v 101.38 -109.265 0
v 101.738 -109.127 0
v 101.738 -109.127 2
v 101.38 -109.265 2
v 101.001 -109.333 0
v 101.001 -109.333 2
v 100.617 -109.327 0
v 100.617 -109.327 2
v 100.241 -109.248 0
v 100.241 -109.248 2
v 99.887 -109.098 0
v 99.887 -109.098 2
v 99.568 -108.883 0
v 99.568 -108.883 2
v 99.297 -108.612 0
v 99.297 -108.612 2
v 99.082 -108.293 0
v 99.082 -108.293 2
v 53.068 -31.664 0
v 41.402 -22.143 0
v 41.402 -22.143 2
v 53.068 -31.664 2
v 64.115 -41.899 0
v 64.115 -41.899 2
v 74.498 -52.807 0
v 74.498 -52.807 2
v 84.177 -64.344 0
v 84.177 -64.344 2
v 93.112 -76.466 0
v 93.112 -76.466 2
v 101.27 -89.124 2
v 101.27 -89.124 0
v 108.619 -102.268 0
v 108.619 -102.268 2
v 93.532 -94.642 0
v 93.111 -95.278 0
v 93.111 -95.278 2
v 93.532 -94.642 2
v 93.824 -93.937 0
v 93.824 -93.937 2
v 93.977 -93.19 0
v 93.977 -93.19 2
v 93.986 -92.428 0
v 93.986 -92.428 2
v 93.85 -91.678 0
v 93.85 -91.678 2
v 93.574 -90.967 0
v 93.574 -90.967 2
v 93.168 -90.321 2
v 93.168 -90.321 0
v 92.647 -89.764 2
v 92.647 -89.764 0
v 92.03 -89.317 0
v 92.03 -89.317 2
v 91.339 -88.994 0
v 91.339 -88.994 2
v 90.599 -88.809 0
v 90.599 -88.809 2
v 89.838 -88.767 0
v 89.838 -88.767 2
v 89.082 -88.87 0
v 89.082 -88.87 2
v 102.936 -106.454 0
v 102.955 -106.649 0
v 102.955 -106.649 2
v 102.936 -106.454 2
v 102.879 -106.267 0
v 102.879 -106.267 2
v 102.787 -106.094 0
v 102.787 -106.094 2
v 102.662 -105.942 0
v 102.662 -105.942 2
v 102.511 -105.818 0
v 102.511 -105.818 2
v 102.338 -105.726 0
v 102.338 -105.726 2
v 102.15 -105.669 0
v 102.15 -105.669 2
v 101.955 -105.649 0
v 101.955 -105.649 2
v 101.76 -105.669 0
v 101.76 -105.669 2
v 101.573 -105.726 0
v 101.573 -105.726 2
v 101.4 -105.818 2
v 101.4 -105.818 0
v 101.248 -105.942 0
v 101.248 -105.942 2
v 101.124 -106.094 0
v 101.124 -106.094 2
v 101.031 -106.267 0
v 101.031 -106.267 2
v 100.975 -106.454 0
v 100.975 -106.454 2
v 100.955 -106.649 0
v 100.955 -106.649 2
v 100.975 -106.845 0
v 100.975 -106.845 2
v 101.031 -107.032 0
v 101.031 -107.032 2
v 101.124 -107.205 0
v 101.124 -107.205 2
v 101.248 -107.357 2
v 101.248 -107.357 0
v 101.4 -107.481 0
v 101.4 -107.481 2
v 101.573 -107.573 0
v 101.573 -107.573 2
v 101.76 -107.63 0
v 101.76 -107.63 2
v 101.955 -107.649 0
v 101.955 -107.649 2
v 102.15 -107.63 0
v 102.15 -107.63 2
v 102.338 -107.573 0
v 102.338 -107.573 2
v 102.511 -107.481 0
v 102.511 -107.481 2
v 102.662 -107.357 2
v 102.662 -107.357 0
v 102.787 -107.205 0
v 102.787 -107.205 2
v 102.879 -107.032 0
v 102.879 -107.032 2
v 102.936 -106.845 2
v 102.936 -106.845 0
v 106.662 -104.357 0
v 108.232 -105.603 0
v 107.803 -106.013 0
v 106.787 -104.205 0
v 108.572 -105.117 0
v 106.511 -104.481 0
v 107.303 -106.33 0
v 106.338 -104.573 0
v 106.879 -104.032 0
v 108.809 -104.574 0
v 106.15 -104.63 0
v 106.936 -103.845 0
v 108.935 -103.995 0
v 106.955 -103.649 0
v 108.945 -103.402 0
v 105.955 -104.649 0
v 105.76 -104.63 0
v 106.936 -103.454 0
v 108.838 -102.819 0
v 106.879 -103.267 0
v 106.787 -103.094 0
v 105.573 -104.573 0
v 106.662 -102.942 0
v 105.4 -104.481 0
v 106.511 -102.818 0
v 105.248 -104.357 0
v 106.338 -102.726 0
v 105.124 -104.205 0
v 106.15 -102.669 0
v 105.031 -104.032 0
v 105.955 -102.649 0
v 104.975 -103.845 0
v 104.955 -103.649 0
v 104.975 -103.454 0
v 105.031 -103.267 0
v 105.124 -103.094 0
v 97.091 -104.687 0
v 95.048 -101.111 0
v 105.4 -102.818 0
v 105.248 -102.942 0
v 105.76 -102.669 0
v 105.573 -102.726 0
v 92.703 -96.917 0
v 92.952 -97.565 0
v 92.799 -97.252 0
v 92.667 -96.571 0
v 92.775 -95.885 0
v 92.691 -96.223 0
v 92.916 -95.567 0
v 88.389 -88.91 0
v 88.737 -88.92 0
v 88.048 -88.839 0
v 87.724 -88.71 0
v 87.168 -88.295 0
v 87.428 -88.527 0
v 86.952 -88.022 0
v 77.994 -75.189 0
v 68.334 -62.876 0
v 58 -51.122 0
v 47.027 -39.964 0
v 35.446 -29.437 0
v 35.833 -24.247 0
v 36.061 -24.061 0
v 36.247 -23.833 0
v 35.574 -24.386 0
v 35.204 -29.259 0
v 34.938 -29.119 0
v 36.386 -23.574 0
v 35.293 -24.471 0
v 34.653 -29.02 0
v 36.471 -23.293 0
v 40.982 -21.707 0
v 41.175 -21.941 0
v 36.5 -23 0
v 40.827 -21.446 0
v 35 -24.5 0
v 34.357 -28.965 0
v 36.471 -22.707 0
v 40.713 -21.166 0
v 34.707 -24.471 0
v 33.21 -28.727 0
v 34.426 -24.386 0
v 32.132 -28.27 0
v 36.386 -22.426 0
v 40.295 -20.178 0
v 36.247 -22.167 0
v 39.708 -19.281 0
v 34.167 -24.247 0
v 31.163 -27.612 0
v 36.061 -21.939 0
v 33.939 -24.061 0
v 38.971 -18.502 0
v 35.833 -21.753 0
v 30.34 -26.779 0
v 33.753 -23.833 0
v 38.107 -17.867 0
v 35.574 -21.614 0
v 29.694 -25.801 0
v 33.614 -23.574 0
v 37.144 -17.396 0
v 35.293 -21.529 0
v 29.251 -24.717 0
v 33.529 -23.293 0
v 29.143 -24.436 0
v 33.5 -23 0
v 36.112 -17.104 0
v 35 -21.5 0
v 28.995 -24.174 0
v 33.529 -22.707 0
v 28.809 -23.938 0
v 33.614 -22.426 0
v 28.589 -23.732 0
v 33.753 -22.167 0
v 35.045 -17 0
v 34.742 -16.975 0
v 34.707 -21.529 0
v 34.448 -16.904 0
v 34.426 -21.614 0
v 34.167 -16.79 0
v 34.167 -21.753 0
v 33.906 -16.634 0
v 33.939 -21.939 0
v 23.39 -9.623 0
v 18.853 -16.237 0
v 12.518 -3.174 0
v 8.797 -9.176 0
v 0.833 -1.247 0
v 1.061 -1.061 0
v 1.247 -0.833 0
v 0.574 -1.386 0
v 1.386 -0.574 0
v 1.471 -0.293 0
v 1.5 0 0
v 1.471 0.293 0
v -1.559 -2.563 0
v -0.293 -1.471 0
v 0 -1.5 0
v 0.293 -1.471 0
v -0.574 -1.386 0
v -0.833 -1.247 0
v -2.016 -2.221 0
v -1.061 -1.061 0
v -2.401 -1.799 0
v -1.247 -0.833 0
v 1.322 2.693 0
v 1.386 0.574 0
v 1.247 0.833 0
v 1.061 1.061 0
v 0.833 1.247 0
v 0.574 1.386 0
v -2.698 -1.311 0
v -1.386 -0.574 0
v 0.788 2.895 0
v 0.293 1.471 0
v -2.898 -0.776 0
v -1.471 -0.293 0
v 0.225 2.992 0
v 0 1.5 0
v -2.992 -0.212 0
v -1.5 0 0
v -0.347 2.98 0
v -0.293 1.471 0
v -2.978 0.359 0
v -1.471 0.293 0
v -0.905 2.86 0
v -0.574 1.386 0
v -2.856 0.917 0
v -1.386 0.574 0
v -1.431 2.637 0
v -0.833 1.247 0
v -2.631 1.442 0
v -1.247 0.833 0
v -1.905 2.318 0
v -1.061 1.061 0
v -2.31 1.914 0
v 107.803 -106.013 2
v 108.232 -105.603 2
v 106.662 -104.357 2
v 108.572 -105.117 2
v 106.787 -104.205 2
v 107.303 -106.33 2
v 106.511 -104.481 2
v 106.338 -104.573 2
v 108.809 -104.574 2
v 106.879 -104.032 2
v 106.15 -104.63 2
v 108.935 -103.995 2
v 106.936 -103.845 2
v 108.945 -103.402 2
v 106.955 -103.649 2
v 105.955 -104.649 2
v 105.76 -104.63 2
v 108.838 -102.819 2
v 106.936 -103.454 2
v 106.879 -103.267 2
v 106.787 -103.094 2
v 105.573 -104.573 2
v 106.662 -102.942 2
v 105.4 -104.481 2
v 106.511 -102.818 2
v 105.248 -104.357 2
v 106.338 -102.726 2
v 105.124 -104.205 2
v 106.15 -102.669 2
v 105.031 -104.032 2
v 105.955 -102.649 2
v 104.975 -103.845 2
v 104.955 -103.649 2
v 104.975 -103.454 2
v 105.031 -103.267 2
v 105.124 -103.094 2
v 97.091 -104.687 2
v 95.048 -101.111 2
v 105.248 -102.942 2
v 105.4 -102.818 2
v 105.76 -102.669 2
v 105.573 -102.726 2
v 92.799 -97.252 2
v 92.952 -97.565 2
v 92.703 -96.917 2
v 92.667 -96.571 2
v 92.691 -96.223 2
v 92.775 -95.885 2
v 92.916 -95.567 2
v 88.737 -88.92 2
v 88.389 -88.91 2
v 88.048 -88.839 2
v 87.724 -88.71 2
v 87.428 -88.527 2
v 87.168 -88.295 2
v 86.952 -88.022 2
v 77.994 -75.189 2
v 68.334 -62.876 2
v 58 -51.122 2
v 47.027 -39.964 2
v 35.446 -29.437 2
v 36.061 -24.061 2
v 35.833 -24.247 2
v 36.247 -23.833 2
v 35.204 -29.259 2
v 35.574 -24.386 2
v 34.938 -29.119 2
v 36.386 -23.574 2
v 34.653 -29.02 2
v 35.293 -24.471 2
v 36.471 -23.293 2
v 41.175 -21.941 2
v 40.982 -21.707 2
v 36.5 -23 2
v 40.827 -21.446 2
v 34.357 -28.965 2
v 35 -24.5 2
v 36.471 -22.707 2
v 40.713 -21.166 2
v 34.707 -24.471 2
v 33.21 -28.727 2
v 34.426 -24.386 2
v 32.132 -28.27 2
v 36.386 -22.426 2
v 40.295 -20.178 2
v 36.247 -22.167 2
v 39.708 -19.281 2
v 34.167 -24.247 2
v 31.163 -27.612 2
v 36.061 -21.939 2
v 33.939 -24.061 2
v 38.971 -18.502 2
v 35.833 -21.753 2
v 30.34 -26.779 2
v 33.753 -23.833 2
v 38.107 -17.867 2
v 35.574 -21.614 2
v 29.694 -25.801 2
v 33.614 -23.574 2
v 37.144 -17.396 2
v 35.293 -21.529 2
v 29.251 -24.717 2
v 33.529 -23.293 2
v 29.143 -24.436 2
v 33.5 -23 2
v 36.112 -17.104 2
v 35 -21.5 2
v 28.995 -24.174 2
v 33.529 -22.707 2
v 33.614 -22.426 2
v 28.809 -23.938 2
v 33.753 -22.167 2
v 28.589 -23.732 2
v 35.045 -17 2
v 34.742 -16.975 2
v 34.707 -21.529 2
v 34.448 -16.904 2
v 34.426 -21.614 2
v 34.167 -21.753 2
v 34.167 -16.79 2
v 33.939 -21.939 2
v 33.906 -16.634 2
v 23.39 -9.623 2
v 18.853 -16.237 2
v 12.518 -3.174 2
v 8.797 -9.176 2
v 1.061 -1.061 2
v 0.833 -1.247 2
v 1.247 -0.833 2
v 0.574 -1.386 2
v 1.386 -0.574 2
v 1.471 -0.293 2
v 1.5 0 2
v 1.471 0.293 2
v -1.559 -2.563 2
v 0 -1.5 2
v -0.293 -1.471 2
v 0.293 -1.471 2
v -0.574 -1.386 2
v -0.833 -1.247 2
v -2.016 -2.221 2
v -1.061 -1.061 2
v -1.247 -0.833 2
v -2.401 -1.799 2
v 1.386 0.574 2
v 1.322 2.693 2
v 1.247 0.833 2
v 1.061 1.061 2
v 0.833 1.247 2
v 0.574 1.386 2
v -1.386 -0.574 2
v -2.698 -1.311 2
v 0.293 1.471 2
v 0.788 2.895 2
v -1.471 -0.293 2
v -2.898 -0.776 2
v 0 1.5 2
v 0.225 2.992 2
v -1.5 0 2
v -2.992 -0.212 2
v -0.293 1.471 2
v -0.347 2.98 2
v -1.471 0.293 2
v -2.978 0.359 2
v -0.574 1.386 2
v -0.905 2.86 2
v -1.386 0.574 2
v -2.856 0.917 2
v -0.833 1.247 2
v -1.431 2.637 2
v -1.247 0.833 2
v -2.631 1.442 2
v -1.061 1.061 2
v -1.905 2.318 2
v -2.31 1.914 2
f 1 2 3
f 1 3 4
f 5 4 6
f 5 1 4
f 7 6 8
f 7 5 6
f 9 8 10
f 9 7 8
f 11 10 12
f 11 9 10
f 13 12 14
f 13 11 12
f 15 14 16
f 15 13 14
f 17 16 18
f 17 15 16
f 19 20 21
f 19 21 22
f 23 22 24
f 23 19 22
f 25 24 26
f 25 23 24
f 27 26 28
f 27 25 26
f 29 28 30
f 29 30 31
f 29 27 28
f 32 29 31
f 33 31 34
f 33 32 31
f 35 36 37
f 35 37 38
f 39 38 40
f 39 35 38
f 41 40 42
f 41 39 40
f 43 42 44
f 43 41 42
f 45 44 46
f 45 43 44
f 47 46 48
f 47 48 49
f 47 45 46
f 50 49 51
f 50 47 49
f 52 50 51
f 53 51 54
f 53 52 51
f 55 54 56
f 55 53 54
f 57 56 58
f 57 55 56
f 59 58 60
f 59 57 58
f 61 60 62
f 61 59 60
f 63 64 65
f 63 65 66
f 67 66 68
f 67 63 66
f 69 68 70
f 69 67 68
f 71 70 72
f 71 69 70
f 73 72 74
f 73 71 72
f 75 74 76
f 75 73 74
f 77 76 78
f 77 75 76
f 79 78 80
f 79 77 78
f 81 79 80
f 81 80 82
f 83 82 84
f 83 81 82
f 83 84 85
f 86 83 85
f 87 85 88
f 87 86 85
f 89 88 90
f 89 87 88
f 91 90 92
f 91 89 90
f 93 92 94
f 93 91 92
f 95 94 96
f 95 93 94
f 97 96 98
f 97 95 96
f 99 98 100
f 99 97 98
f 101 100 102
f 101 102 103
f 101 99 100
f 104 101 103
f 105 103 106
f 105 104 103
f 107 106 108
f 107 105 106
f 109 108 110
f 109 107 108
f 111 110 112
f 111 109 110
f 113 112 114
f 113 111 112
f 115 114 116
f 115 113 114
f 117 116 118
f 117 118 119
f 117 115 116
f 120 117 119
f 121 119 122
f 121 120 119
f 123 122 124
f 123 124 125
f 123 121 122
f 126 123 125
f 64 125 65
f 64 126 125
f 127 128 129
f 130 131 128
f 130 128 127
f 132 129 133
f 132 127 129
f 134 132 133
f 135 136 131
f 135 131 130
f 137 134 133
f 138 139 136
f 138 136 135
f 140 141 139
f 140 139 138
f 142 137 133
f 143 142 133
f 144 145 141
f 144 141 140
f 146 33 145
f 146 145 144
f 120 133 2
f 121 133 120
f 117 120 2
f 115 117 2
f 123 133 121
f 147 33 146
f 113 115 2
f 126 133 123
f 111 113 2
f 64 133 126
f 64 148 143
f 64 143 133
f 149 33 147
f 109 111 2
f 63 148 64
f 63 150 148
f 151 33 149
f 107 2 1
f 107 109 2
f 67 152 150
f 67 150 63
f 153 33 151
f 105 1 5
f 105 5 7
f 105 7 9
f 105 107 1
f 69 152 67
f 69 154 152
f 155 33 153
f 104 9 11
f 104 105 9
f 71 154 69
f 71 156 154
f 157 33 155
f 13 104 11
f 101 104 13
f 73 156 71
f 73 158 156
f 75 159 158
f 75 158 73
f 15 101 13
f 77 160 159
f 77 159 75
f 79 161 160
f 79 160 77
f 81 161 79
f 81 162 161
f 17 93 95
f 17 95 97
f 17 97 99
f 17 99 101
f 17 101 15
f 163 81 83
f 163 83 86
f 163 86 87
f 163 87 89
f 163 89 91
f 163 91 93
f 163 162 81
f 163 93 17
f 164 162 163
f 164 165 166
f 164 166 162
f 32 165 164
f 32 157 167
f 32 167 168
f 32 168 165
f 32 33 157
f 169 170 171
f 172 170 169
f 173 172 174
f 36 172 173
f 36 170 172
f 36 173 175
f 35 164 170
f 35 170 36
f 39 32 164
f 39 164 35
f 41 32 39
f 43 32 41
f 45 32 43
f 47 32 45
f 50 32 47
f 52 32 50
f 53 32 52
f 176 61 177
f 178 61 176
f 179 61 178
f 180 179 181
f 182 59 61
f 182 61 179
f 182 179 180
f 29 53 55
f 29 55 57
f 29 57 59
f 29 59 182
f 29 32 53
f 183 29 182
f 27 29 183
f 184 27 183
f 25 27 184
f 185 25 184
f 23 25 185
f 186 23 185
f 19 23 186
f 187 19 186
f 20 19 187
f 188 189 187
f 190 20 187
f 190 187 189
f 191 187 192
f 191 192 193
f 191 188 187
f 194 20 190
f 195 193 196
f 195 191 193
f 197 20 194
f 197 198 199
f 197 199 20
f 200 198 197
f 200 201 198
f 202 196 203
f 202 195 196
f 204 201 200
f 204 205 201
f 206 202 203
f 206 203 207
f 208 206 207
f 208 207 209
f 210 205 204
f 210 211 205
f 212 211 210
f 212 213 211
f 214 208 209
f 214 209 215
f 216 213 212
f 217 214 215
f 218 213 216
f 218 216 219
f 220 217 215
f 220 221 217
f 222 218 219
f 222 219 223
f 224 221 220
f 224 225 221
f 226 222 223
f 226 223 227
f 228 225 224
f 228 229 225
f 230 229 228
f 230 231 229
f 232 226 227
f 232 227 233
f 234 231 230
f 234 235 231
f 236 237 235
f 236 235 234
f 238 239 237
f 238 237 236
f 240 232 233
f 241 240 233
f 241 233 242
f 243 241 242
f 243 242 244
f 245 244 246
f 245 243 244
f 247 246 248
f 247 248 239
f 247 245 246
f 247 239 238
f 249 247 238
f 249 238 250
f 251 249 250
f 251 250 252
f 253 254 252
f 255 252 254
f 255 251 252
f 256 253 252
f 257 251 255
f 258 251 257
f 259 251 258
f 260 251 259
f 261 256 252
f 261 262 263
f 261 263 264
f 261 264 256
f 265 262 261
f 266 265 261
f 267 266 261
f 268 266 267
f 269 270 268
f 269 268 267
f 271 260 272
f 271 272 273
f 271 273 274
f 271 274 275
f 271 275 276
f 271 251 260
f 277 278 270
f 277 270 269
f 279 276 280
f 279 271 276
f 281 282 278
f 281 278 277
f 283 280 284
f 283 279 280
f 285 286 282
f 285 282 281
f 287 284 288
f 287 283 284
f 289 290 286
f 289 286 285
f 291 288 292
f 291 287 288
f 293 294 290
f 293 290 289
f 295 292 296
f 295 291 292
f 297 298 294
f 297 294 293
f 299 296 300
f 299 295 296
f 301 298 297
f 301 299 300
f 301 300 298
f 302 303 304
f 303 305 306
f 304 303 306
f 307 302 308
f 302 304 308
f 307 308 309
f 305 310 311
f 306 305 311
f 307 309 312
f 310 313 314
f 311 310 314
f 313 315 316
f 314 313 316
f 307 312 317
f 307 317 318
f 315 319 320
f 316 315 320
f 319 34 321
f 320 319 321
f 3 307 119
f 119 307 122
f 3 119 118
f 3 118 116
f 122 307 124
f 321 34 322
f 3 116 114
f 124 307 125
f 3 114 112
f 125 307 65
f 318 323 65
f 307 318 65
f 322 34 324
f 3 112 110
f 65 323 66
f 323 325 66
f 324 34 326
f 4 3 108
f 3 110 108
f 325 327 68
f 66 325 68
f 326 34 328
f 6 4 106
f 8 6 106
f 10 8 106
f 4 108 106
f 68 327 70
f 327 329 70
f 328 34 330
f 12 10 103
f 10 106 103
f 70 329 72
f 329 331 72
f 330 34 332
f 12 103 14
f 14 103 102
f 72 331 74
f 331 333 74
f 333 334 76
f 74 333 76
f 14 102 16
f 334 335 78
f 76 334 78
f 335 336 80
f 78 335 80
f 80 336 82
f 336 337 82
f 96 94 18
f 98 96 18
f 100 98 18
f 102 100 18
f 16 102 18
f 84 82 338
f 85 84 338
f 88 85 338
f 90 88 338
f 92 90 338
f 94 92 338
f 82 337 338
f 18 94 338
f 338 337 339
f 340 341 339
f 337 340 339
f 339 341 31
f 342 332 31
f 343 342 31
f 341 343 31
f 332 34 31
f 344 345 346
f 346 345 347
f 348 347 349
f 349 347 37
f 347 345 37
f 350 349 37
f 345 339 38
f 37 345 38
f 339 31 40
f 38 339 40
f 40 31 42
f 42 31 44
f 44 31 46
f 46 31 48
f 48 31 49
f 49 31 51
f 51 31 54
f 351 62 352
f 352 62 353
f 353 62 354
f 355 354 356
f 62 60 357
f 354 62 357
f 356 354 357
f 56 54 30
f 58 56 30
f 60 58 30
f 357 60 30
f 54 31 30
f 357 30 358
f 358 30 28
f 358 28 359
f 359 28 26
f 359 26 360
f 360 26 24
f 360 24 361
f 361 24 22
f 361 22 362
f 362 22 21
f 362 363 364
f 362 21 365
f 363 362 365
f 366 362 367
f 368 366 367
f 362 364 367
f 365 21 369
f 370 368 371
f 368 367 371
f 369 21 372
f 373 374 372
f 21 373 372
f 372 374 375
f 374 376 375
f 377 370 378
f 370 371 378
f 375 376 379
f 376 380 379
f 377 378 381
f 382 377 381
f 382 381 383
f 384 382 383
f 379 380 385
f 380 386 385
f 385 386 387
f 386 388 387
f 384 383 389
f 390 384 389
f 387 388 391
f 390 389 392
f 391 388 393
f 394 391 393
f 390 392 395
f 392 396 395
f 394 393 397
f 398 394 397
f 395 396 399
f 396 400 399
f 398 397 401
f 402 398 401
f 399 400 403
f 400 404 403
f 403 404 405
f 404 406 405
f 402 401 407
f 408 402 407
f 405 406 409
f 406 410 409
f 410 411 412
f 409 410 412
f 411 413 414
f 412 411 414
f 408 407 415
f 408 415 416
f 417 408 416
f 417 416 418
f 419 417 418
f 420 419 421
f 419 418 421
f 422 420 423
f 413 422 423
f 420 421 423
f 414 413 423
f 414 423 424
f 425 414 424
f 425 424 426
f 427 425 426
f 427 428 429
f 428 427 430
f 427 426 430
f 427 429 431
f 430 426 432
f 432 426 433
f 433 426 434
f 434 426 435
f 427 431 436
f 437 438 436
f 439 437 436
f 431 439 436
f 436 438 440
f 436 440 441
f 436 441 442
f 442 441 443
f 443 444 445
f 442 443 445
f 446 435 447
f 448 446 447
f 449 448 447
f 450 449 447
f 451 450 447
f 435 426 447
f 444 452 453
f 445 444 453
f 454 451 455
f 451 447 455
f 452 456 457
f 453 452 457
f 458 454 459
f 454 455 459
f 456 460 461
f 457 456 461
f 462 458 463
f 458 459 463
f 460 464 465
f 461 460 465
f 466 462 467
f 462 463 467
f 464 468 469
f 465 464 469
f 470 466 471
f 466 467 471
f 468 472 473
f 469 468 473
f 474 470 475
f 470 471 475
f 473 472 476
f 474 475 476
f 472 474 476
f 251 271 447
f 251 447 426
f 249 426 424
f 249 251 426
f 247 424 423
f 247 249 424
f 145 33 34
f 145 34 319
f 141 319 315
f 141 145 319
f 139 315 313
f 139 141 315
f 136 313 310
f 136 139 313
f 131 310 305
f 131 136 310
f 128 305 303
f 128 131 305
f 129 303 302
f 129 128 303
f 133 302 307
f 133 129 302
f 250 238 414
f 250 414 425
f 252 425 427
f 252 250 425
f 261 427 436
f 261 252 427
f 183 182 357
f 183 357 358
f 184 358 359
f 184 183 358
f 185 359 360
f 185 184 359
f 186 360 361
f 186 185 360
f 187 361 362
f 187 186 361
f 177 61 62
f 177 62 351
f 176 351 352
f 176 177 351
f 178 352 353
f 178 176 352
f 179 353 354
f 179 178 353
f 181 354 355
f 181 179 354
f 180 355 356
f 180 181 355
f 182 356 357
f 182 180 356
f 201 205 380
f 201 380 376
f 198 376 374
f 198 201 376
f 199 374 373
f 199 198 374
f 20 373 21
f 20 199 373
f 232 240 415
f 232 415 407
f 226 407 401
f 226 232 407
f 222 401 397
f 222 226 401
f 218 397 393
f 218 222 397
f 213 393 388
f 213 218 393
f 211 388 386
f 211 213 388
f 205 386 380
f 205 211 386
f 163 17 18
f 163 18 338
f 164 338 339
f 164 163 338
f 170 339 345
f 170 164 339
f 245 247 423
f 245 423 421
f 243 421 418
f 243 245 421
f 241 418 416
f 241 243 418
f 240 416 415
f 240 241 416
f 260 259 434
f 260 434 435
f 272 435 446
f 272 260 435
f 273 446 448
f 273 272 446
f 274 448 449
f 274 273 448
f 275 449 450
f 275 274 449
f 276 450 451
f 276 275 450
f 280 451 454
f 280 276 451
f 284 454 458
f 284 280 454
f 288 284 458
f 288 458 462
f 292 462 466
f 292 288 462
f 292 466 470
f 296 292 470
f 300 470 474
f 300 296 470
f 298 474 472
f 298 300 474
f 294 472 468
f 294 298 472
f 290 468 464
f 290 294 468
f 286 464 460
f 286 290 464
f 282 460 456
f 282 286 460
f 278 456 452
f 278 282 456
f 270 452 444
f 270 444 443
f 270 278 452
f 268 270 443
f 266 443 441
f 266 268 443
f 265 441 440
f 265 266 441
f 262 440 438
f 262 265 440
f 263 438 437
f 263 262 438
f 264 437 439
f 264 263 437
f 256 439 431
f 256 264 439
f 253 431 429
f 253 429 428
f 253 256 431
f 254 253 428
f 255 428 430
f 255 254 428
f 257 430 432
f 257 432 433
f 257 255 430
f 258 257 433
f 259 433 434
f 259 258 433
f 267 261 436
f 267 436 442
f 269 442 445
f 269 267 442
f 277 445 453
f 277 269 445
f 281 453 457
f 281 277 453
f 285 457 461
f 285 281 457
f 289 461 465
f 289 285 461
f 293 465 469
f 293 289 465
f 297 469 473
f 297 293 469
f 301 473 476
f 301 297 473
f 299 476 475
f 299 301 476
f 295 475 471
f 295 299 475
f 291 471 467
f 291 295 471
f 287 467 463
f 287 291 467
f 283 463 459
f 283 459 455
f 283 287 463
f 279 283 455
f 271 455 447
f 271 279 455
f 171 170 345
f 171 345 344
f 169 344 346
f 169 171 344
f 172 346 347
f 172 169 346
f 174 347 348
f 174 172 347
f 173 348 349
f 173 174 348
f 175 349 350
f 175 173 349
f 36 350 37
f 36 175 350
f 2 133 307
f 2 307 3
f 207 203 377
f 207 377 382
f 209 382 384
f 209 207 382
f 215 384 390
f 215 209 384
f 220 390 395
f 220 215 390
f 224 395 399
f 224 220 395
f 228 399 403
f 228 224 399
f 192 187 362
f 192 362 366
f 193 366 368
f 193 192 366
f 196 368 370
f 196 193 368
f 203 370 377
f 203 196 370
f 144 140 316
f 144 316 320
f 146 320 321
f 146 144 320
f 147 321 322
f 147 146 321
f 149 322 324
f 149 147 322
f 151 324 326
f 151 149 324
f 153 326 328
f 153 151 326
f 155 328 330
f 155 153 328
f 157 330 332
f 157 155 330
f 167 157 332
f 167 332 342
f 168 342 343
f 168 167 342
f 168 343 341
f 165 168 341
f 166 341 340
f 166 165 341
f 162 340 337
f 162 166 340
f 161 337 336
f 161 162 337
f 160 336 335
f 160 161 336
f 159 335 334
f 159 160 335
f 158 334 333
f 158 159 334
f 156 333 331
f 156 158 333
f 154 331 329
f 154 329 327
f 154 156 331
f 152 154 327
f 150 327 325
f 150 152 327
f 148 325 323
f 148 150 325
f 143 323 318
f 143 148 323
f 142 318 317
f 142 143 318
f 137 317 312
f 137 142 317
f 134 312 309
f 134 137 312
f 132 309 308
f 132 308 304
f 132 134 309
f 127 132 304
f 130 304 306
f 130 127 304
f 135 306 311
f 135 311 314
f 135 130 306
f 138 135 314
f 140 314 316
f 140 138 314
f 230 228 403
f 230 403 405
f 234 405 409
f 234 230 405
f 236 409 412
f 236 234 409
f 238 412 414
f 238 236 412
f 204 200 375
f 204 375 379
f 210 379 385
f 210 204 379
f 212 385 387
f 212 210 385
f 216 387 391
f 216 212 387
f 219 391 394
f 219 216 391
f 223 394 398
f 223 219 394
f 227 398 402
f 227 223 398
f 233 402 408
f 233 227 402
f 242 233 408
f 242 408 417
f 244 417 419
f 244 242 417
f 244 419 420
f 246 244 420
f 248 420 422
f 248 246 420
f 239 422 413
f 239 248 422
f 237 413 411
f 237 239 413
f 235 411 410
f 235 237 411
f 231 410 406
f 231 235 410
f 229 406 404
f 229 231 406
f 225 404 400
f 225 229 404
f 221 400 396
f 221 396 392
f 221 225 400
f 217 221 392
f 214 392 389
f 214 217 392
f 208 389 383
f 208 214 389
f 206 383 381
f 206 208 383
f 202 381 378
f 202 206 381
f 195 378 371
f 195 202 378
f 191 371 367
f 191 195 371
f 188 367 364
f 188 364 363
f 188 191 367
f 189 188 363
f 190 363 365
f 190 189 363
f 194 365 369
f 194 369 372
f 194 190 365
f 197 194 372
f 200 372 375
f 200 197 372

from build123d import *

# Parameters (mm, degrees)
SKETCH_1_R      = 1.5
SKETCH_1_R_2    = 1
EXTRUDE_1_DEPTH = 2


with BuildPart() as part:
    # 草图1 → 凸台-拉伸1 (new body)
    with BuildSketch(Plane.XY):
        with BuildLine():
            Line((107.302513423, -106.329977447), (101.737876551, -109.126595767))
            ThreePointArc((101.737876551, -109.126595767), (100.241041238, -109.247857431), (99.081776454, -108.293223729))
            ThreePointArc((99.081776454, -108.293223729), (96.076157143, -102.895430459), (92.952174798, -97.565265927))
            ThreePointArc((92.952174798, -97.565265927), (92.67119221, -96.396525563), (93.110928625, -95.277804356))
            ThreePointArc((93.110928625, -95.277804356), (93.386262354, -90.634283432), (89.082079375, -88.870167754))
            ThreePointArc((89.082079375, -88.870167754), (87.883298953, -88.781676215), (86.951761021, -88.02197737))
            ThreePointArc((86.951761021, -88.02197737), (63.249240179, -56.927091802), (35.446375502, -29.437055089))
            ThreePointArc((35.446375502, -29.437055089), (34.93756912, -29.118601809), (34.357184804, -28.965466337))
            ThreePointArc((34.357184804, -28.965466337), (31.162596189, -27.612410648), (29.250996223, -24.717252331))
            ThreePointArc((29.250996223, -24.717252331), (28.99483955, -24.174407799), (28.589143834, -23.732019493))
            ThreePointArc((28.589143834, -23.732019493), (13.863721442, -12.651321704), (-1.558710581, -2.56328331))
            ThreePointArc((-1.558710581, -2.56328331), (-2.630799159, 1.441837641), (1.322046154, 2.692989782))
            ThreePointArc((1.322046154, 2.692989782), (17.996215952, -6.326789823), (33.906457747, -16.634484455))
            ThreePointArc((33.906457747, -16.634484455), (34.447529327, -16.904338105), (35.04451896, -17.000165164))
            ThreePointArc((35.04451896, -17.000165164), (38.553058948, -18.165150249), (40.712715331, -21.16563811))
            ThreePointArc((40.712715331, -21.16563811), (40.982462328, -21.706762868), (41.401593445, -22.142547854))
            ThreePointArc((41.401593445, -22.142547854), (79.427798672, -58.499548545), (108.618618094, -102.268485529))
            ThreePointArc((108.618618094, -102.268485529), (108.809267395, -104.574248701), (107.302513423, -106.329977447))
        make_face()
        Circle(SKETCH_1_R, mode=Mode.SUBTRACT)
        with Locations((105.955364791, -103.64945687)):
            Circle(SKETCH_1_R_2, mode=Mode.SUBTRACT)
        with Locations((101.955364791, -106.64945687)):
            Circle(SKETCH_1_R_2, mode=Mode.SUBTRACT)
        with Locations((35, -23)):
            Circle(SKETCH_1_R, mode=Mode.SUBTRACT)
    extrude(amount=EXTRUDE_1_DEPTH)


solid = part.part
